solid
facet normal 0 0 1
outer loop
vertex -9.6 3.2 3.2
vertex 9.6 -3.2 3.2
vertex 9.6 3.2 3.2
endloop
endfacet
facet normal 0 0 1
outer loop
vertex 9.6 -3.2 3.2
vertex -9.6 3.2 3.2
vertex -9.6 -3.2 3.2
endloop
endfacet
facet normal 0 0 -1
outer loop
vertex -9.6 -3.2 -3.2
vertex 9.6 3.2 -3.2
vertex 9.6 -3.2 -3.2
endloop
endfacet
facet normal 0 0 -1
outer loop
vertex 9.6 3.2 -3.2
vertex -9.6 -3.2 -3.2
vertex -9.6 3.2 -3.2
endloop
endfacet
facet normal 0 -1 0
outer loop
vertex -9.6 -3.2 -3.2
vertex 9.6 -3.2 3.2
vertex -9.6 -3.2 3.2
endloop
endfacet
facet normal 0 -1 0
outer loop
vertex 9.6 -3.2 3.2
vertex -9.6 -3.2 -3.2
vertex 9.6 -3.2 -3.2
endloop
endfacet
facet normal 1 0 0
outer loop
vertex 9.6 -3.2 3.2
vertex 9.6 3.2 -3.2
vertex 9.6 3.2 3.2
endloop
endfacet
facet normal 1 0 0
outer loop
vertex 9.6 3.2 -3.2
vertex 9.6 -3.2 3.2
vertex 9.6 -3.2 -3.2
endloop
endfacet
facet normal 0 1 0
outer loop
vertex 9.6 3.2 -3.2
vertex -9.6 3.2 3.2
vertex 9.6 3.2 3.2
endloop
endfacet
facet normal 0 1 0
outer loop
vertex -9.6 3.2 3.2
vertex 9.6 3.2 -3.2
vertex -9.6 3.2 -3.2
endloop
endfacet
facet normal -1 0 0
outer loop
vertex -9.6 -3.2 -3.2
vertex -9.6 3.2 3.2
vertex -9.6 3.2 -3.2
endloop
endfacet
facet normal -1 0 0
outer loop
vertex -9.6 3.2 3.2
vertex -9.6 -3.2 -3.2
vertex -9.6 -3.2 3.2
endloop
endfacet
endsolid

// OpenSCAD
size=32; //block=32 //item=8

cube([size*0.60,size*0.20,size*0.2],center=true);
